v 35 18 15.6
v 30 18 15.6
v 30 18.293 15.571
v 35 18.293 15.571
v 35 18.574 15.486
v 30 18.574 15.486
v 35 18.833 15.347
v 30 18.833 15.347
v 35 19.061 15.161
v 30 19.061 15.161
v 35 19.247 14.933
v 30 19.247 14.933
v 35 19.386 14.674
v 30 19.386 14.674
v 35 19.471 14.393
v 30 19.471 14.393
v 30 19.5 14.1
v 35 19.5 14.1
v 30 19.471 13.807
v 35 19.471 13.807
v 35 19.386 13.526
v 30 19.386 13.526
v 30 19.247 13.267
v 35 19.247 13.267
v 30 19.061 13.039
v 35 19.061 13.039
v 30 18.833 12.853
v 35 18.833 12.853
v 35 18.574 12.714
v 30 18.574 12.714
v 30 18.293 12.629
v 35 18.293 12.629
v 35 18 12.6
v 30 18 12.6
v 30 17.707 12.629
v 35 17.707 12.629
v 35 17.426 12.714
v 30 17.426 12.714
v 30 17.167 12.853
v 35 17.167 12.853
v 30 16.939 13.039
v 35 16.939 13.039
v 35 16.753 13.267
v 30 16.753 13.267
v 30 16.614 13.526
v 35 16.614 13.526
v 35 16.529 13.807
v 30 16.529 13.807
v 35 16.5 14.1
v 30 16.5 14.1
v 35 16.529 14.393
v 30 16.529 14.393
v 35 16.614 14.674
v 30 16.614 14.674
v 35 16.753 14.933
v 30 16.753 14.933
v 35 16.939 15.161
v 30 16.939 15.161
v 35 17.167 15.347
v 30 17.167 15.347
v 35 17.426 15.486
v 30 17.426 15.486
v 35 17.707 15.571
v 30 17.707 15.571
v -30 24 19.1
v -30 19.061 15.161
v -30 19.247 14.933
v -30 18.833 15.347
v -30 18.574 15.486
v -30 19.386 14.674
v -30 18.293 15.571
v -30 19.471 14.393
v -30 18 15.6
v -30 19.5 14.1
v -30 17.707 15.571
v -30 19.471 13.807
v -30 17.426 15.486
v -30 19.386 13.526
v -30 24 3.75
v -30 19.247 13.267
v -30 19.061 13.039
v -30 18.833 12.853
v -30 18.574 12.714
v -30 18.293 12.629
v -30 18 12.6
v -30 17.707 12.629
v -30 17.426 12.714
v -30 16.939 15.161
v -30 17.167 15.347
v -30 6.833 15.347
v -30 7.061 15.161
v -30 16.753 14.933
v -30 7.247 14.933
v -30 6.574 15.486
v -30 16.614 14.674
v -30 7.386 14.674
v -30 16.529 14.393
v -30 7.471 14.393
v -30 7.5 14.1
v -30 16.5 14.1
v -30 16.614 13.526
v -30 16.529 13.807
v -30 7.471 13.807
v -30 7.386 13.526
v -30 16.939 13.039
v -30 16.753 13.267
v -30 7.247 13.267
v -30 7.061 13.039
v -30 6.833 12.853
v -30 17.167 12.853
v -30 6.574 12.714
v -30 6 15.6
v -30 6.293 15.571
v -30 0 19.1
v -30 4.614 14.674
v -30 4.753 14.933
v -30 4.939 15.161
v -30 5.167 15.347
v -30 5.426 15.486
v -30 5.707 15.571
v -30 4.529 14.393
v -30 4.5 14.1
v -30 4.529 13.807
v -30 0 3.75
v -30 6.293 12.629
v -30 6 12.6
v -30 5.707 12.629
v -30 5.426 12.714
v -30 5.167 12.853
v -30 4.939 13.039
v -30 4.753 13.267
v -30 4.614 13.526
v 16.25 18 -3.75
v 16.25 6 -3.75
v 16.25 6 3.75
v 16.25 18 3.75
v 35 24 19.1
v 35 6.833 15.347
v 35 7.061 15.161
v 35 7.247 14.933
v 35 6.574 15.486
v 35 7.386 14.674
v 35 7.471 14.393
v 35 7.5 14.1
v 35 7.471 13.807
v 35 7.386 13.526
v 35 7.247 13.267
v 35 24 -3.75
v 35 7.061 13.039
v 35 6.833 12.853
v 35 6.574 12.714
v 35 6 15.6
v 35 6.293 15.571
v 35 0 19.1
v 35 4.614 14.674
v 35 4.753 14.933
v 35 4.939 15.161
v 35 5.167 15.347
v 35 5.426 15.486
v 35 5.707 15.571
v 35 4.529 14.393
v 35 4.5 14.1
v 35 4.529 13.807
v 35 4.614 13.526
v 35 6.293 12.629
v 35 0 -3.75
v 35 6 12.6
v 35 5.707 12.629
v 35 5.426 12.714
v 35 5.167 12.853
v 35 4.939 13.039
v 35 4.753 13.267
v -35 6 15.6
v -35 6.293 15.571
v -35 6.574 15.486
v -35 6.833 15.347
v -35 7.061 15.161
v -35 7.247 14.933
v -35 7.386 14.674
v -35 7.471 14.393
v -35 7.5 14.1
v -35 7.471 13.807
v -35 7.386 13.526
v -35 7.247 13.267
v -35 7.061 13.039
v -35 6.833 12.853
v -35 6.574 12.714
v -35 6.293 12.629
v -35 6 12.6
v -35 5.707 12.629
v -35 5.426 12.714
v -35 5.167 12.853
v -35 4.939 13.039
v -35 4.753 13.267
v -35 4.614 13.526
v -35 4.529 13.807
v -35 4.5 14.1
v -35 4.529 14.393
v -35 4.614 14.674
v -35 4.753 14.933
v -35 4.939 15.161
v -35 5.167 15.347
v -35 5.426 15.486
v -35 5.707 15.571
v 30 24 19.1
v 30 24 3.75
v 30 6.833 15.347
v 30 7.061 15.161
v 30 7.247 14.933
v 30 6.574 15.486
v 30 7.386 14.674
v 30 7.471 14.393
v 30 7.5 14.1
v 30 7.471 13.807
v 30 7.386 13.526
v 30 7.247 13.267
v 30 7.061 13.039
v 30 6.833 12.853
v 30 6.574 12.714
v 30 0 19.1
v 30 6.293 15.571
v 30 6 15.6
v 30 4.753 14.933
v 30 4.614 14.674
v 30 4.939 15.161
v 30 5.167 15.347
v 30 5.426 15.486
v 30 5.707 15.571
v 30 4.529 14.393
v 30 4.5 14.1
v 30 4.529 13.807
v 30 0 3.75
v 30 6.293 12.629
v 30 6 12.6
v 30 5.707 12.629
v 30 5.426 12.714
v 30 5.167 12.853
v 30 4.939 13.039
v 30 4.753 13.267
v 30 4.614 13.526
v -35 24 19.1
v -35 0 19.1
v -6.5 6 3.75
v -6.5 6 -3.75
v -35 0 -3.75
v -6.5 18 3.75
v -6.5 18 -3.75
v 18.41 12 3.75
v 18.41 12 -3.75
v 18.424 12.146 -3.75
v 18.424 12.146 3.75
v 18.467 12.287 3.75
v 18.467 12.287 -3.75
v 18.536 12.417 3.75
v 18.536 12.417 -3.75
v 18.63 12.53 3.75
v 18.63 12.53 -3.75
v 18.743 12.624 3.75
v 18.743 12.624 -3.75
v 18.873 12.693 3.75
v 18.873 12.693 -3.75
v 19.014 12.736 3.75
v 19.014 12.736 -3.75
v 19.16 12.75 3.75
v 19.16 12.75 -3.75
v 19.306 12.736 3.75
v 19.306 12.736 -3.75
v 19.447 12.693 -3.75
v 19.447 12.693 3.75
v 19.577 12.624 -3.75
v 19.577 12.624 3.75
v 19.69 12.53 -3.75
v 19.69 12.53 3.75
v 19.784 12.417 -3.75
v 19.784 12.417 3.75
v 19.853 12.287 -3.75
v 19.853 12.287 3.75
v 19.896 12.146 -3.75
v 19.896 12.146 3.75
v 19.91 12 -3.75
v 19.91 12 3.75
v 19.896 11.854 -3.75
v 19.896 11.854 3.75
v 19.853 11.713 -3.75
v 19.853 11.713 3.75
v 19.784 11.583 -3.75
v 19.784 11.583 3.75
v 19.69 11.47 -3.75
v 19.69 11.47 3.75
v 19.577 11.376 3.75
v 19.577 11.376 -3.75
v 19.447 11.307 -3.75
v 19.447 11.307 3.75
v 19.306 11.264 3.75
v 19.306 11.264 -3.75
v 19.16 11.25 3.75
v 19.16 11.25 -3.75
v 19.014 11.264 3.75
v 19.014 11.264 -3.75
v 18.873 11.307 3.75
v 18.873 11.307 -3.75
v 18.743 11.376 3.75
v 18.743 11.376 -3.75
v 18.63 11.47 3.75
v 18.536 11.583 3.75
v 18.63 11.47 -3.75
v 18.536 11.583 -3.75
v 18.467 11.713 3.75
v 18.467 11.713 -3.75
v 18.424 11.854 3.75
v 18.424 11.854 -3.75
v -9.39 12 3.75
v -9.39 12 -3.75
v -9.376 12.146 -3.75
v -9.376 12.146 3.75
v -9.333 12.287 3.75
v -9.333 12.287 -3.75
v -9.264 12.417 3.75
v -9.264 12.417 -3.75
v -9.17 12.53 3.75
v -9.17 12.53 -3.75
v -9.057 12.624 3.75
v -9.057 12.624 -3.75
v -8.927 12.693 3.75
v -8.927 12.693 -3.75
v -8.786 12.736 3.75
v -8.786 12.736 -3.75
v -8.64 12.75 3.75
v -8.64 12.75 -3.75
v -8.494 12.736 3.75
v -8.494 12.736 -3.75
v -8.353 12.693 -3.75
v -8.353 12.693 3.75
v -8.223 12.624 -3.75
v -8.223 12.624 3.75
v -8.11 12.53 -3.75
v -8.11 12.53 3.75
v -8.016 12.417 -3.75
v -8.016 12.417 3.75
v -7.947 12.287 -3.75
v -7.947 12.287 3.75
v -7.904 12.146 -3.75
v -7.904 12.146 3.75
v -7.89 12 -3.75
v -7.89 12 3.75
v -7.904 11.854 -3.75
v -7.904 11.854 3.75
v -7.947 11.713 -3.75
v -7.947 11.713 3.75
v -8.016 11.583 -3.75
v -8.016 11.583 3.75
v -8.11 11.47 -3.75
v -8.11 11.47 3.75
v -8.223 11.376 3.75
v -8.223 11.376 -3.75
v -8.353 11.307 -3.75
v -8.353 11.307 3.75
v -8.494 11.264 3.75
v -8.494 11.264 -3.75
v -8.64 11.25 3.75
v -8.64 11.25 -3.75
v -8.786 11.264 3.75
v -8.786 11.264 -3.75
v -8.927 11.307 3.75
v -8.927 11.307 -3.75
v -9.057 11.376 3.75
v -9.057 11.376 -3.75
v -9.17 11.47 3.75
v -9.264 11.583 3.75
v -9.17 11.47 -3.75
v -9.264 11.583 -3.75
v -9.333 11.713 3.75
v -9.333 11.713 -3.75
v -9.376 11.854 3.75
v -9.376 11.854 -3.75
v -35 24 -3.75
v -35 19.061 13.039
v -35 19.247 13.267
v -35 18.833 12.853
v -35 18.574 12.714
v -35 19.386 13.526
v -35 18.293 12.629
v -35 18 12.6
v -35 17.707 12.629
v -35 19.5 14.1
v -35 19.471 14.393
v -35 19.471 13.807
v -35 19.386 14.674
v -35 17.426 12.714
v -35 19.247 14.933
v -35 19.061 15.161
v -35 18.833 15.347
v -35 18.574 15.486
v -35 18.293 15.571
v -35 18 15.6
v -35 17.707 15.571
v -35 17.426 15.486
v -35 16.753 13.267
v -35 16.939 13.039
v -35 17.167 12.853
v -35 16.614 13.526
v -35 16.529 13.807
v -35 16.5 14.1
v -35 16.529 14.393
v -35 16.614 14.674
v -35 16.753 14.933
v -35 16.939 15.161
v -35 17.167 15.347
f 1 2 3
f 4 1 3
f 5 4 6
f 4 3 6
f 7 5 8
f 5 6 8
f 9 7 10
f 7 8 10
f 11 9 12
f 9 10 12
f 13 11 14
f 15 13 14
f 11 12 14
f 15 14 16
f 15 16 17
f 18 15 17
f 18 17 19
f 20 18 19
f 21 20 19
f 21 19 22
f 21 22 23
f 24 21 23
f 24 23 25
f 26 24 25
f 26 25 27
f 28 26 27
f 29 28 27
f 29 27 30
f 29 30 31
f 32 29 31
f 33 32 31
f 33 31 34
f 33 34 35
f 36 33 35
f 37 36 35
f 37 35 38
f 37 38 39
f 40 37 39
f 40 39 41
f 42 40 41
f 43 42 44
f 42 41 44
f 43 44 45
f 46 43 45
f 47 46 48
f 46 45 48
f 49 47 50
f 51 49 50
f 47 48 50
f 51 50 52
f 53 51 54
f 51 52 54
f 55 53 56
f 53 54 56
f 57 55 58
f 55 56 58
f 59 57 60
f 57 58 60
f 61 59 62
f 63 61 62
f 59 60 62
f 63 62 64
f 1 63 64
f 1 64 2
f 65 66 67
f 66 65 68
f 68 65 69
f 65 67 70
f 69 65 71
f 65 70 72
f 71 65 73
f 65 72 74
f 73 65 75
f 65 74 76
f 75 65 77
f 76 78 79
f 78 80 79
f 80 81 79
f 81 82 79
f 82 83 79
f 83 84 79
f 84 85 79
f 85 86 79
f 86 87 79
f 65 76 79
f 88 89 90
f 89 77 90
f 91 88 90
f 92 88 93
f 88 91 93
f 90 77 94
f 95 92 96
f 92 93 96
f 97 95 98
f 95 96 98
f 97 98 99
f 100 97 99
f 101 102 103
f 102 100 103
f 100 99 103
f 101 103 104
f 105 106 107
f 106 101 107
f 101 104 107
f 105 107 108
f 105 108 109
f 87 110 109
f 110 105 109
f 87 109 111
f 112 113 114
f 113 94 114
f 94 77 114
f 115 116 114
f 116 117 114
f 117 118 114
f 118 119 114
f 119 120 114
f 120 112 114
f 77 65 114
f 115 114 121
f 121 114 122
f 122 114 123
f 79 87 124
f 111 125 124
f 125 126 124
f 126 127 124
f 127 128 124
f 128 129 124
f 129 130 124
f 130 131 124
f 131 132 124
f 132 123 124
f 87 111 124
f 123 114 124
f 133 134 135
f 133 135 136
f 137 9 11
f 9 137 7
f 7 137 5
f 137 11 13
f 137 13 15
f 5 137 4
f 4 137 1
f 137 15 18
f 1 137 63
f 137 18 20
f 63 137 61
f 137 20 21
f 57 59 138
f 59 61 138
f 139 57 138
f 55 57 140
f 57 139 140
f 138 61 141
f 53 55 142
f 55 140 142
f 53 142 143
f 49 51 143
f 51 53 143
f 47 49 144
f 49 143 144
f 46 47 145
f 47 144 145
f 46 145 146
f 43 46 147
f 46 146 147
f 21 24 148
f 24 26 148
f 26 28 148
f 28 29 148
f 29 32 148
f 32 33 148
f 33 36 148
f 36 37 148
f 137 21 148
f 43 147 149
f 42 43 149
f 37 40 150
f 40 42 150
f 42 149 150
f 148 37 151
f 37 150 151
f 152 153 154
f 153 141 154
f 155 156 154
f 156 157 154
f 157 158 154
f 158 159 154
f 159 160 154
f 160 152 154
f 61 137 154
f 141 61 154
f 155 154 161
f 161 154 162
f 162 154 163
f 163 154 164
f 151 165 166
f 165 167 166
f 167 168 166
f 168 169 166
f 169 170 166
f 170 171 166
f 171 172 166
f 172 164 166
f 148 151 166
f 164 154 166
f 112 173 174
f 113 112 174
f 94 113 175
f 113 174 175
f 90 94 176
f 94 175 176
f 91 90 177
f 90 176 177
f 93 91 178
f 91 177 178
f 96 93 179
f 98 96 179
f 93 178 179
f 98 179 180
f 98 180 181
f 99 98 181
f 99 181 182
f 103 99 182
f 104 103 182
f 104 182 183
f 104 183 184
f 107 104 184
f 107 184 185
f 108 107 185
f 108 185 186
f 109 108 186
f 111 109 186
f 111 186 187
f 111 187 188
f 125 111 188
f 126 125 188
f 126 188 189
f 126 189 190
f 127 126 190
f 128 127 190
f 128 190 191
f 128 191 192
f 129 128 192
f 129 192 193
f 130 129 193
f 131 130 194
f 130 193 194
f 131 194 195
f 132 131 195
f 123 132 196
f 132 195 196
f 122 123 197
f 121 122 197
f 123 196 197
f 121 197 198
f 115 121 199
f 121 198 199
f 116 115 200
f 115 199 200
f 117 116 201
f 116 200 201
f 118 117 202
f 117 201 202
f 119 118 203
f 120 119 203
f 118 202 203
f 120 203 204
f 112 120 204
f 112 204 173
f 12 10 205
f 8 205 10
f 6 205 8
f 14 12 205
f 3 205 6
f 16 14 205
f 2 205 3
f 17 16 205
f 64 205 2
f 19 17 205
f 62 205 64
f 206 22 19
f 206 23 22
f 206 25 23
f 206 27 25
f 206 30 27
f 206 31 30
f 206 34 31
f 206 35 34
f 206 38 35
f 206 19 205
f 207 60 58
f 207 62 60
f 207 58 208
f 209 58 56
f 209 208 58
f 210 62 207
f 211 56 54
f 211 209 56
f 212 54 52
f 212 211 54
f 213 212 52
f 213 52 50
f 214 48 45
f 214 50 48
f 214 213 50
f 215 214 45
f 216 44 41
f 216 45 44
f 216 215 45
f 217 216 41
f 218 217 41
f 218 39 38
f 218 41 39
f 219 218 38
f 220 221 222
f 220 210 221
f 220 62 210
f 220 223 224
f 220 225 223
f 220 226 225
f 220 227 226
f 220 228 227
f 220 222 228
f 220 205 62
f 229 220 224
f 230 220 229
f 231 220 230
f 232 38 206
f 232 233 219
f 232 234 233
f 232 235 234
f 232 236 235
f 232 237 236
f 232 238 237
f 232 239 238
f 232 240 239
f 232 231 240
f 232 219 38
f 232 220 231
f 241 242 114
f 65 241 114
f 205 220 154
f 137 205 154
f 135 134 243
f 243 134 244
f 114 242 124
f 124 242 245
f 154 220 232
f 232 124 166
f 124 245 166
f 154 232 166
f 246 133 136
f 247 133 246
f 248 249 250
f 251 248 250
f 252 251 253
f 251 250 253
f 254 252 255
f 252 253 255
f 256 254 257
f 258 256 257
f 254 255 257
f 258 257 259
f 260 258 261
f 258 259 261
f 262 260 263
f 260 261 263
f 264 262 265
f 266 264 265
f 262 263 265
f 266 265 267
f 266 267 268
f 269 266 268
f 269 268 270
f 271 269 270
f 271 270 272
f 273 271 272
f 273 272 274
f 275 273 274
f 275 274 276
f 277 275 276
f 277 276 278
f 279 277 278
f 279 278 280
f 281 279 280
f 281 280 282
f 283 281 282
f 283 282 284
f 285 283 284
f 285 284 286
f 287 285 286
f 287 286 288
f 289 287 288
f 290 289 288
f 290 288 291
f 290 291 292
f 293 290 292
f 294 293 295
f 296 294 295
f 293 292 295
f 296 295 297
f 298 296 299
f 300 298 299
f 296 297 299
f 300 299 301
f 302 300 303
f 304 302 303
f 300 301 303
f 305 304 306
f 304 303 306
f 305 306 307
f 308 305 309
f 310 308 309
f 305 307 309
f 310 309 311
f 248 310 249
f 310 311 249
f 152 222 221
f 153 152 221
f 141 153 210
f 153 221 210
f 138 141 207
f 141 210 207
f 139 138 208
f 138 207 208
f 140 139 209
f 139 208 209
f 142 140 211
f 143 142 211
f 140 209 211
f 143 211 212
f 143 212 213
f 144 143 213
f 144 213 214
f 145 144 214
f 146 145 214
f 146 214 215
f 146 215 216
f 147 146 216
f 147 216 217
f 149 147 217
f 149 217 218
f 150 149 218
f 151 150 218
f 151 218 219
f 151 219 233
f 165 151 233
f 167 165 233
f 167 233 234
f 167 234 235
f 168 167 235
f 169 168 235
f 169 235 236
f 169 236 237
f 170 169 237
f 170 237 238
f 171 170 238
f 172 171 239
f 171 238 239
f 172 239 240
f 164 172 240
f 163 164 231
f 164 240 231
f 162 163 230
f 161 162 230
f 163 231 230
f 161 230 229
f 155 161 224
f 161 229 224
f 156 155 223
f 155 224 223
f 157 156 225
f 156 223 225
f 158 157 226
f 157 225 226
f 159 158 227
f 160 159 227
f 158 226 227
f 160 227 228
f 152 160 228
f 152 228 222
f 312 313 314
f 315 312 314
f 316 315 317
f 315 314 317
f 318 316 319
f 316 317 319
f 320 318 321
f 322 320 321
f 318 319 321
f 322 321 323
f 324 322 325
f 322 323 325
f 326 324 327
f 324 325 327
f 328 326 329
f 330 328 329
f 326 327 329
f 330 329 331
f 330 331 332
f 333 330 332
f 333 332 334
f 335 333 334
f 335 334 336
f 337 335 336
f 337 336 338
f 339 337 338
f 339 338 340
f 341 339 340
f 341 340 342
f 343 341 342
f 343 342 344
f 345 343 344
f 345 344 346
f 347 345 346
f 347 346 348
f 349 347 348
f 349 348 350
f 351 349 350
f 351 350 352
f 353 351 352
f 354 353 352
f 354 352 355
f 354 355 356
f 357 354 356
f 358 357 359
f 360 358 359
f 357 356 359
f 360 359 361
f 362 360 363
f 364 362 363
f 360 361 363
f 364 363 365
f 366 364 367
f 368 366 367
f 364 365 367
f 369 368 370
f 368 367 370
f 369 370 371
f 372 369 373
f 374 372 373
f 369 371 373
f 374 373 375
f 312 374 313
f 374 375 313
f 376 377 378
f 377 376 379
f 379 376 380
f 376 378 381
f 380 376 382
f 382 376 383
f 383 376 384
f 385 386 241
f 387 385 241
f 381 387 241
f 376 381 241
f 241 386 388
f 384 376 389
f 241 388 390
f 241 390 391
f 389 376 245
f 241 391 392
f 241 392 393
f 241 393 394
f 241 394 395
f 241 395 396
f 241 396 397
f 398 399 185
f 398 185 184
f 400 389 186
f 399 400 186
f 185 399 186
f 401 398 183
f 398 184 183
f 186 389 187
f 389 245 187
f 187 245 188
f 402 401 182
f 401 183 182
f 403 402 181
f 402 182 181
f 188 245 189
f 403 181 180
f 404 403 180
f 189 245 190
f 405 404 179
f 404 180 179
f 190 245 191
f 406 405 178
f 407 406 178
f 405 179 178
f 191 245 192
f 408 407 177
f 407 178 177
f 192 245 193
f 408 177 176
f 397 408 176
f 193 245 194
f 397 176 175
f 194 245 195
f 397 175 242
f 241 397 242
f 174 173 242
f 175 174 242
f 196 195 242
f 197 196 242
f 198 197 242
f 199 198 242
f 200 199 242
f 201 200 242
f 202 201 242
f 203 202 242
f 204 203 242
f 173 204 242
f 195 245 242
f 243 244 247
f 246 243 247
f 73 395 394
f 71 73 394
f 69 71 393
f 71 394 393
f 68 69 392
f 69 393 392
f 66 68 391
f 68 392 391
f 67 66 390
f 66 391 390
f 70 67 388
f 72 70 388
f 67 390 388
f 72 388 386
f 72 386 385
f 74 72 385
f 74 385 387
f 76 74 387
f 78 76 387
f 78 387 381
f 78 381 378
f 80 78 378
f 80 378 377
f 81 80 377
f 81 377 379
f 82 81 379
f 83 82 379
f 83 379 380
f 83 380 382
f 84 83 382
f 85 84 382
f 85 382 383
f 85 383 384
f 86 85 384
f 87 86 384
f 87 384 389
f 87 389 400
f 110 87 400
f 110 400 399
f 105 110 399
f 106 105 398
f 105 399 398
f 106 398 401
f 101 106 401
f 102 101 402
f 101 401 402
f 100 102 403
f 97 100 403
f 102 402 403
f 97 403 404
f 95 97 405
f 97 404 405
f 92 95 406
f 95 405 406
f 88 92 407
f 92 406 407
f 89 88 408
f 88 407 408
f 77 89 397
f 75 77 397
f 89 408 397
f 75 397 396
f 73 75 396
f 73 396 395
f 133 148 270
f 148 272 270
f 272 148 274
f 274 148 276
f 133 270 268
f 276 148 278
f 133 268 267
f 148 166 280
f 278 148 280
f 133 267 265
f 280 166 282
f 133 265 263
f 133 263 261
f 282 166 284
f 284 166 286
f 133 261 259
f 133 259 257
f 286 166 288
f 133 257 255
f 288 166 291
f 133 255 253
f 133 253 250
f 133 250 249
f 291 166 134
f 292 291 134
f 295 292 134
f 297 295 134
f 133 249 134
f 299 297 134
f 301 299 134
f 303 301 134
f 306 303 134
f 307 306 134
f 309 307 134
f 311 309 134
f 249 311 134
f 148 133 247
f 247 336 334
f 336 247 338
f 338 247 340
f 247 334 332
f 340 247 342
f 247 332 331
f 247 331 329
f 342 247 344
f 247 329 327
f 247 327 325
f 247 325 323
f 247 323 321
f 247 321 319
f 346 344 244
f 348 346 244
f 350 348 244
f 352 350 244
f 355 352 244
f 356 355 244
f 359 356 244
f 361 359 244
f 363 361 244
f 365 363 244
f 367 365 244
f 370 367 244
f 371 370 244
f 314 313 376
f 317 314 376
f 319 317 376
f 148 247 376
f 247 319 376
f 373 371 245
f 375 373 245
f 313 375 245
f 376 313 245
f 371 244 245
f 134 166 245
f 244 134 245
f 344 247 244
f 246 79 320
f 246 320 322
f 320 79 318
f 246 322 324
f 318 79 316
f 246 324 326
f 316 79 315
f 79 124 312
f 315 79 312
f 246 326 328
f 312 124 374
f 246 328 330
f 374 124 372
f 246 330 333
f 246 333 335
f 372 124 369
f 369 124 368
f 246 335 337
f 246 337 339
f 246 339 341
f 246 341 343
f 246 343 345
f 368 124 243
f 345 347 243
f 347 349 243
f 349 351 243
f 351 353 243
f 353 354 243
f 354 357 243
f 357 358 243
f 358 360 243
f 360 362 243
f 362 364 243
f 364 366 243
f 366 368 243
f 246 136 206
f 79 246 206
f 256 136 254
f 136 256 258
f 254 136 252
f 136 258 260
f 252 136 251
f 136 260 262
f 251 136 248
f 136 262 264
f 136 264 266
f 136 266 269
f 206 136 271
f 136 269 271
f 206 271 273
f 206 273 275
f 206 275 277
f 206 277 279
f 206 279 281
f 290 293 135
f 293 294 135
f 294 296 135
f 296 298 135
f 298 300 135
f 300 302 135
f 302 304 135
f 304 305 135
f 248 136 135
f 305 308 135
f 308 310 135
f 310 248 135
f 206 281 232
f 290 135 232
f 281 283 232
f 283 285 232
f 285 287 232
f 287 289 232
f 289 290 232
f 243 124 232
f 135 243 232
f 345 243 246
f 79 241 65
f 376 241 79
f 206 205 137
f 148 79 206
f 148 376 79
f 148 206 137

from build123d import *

# Parameters (mm, degrees)
SKETCH1_W           = 5
SKETCH1_H           = 15.35
BOSS_EXTRUDE1_DEPTH = 24
SKETCH2_R           = 1.5
CUT_EXTRUDE1_DEPTH  = 77.425192182
CUT_EXTRUDE4_REACH  = 50.199
SKETCH8_W           = 22.75
SKETCH8_H           = 12
SKETCH9_R           = 0.75
CUT_EXTRUDE5_DEPTH  = 49.198781105


with BuildPart() as part:
    # Sketch1 → Boss-Extrude1 (new body)
    with BuildSketch(Plane(origin=(0, 0, 0), x_dir=(1, 0, 0), z_dir=(0, 1, 0))):
        with Locations((-32.5, -11.425)):
            Rectangle(SKETCH1_W, SKETCH1_H)
        Polygon((-35, -3.75), (-30, -3.75), (0, -3.75), (0, 3.75), (-35, 3.75), align=None)
        Polygon((0, 3.75), (0, -3.75), (30, -3.75), (35, -3.75), (35, 3.75), align=None)
        with Locations((32.5, -11.425)):
            Rectangle(SKETCH1_W, SKETCH1_H)
    extrude(amount=BOSS_EXTRUDE1_DEPTH)

    # Sketch2 → Cut-Extrude1 (cut, through all)
    with BuildSketch(Plane.ZY.offset(35)):
        with Locations((14.1, 18)):
            Circle(SKETCH2_R)
        with Locations((14.1, 6)):
            Circle(SKETCH2_R)
    extrude(amount=-CUT_EXTRUDE1_DEPTH, mode=Mode.SUBTRACT)

    # Sketch8 → Cut-Extrude4 (cut, up to next)
    with BuildSketch(Plane(origin=(0, 0, -3.75), x_dir=(-1, 0, 0), z_dir=(0, 0, -1)), mode=Mode.PRIVATE) as cut_extrude4_sk1:
        with Locations((-4.875, 12)):
            Rectangle(SKETCH8_W, SKETCH8_H)
    cut_extrude4_tool1 = extrude(cut_extrude4_sk1.sketch, amount=-CUT_EXTRUDE4_REACH, mode=Mode.PRIVATE) & part.part
    add(cut_extrude4_tool1.solids().sort_by_distance((4.875, 12, -3.75))[0], mode=Mode.SUBTRACT)

    # Sketch9 → Cut-Extrude5 (cut, through all)
    with BuildSketch(Plane(origin=(0, 0, -3.75), x_dir=(-1, 0, 0), z_dir=(0, 0, -1))):
        with Locations((-19.16, 12)):
            Circle(SKETCH9_R)
        with Locations((8.64, 12)):
            Circle(SKETCH9_R)
    extrude(amount=-CUT_EXTRUDE5_DEPTH, mode=Mode.SUBTRACT)


solid = part.part
